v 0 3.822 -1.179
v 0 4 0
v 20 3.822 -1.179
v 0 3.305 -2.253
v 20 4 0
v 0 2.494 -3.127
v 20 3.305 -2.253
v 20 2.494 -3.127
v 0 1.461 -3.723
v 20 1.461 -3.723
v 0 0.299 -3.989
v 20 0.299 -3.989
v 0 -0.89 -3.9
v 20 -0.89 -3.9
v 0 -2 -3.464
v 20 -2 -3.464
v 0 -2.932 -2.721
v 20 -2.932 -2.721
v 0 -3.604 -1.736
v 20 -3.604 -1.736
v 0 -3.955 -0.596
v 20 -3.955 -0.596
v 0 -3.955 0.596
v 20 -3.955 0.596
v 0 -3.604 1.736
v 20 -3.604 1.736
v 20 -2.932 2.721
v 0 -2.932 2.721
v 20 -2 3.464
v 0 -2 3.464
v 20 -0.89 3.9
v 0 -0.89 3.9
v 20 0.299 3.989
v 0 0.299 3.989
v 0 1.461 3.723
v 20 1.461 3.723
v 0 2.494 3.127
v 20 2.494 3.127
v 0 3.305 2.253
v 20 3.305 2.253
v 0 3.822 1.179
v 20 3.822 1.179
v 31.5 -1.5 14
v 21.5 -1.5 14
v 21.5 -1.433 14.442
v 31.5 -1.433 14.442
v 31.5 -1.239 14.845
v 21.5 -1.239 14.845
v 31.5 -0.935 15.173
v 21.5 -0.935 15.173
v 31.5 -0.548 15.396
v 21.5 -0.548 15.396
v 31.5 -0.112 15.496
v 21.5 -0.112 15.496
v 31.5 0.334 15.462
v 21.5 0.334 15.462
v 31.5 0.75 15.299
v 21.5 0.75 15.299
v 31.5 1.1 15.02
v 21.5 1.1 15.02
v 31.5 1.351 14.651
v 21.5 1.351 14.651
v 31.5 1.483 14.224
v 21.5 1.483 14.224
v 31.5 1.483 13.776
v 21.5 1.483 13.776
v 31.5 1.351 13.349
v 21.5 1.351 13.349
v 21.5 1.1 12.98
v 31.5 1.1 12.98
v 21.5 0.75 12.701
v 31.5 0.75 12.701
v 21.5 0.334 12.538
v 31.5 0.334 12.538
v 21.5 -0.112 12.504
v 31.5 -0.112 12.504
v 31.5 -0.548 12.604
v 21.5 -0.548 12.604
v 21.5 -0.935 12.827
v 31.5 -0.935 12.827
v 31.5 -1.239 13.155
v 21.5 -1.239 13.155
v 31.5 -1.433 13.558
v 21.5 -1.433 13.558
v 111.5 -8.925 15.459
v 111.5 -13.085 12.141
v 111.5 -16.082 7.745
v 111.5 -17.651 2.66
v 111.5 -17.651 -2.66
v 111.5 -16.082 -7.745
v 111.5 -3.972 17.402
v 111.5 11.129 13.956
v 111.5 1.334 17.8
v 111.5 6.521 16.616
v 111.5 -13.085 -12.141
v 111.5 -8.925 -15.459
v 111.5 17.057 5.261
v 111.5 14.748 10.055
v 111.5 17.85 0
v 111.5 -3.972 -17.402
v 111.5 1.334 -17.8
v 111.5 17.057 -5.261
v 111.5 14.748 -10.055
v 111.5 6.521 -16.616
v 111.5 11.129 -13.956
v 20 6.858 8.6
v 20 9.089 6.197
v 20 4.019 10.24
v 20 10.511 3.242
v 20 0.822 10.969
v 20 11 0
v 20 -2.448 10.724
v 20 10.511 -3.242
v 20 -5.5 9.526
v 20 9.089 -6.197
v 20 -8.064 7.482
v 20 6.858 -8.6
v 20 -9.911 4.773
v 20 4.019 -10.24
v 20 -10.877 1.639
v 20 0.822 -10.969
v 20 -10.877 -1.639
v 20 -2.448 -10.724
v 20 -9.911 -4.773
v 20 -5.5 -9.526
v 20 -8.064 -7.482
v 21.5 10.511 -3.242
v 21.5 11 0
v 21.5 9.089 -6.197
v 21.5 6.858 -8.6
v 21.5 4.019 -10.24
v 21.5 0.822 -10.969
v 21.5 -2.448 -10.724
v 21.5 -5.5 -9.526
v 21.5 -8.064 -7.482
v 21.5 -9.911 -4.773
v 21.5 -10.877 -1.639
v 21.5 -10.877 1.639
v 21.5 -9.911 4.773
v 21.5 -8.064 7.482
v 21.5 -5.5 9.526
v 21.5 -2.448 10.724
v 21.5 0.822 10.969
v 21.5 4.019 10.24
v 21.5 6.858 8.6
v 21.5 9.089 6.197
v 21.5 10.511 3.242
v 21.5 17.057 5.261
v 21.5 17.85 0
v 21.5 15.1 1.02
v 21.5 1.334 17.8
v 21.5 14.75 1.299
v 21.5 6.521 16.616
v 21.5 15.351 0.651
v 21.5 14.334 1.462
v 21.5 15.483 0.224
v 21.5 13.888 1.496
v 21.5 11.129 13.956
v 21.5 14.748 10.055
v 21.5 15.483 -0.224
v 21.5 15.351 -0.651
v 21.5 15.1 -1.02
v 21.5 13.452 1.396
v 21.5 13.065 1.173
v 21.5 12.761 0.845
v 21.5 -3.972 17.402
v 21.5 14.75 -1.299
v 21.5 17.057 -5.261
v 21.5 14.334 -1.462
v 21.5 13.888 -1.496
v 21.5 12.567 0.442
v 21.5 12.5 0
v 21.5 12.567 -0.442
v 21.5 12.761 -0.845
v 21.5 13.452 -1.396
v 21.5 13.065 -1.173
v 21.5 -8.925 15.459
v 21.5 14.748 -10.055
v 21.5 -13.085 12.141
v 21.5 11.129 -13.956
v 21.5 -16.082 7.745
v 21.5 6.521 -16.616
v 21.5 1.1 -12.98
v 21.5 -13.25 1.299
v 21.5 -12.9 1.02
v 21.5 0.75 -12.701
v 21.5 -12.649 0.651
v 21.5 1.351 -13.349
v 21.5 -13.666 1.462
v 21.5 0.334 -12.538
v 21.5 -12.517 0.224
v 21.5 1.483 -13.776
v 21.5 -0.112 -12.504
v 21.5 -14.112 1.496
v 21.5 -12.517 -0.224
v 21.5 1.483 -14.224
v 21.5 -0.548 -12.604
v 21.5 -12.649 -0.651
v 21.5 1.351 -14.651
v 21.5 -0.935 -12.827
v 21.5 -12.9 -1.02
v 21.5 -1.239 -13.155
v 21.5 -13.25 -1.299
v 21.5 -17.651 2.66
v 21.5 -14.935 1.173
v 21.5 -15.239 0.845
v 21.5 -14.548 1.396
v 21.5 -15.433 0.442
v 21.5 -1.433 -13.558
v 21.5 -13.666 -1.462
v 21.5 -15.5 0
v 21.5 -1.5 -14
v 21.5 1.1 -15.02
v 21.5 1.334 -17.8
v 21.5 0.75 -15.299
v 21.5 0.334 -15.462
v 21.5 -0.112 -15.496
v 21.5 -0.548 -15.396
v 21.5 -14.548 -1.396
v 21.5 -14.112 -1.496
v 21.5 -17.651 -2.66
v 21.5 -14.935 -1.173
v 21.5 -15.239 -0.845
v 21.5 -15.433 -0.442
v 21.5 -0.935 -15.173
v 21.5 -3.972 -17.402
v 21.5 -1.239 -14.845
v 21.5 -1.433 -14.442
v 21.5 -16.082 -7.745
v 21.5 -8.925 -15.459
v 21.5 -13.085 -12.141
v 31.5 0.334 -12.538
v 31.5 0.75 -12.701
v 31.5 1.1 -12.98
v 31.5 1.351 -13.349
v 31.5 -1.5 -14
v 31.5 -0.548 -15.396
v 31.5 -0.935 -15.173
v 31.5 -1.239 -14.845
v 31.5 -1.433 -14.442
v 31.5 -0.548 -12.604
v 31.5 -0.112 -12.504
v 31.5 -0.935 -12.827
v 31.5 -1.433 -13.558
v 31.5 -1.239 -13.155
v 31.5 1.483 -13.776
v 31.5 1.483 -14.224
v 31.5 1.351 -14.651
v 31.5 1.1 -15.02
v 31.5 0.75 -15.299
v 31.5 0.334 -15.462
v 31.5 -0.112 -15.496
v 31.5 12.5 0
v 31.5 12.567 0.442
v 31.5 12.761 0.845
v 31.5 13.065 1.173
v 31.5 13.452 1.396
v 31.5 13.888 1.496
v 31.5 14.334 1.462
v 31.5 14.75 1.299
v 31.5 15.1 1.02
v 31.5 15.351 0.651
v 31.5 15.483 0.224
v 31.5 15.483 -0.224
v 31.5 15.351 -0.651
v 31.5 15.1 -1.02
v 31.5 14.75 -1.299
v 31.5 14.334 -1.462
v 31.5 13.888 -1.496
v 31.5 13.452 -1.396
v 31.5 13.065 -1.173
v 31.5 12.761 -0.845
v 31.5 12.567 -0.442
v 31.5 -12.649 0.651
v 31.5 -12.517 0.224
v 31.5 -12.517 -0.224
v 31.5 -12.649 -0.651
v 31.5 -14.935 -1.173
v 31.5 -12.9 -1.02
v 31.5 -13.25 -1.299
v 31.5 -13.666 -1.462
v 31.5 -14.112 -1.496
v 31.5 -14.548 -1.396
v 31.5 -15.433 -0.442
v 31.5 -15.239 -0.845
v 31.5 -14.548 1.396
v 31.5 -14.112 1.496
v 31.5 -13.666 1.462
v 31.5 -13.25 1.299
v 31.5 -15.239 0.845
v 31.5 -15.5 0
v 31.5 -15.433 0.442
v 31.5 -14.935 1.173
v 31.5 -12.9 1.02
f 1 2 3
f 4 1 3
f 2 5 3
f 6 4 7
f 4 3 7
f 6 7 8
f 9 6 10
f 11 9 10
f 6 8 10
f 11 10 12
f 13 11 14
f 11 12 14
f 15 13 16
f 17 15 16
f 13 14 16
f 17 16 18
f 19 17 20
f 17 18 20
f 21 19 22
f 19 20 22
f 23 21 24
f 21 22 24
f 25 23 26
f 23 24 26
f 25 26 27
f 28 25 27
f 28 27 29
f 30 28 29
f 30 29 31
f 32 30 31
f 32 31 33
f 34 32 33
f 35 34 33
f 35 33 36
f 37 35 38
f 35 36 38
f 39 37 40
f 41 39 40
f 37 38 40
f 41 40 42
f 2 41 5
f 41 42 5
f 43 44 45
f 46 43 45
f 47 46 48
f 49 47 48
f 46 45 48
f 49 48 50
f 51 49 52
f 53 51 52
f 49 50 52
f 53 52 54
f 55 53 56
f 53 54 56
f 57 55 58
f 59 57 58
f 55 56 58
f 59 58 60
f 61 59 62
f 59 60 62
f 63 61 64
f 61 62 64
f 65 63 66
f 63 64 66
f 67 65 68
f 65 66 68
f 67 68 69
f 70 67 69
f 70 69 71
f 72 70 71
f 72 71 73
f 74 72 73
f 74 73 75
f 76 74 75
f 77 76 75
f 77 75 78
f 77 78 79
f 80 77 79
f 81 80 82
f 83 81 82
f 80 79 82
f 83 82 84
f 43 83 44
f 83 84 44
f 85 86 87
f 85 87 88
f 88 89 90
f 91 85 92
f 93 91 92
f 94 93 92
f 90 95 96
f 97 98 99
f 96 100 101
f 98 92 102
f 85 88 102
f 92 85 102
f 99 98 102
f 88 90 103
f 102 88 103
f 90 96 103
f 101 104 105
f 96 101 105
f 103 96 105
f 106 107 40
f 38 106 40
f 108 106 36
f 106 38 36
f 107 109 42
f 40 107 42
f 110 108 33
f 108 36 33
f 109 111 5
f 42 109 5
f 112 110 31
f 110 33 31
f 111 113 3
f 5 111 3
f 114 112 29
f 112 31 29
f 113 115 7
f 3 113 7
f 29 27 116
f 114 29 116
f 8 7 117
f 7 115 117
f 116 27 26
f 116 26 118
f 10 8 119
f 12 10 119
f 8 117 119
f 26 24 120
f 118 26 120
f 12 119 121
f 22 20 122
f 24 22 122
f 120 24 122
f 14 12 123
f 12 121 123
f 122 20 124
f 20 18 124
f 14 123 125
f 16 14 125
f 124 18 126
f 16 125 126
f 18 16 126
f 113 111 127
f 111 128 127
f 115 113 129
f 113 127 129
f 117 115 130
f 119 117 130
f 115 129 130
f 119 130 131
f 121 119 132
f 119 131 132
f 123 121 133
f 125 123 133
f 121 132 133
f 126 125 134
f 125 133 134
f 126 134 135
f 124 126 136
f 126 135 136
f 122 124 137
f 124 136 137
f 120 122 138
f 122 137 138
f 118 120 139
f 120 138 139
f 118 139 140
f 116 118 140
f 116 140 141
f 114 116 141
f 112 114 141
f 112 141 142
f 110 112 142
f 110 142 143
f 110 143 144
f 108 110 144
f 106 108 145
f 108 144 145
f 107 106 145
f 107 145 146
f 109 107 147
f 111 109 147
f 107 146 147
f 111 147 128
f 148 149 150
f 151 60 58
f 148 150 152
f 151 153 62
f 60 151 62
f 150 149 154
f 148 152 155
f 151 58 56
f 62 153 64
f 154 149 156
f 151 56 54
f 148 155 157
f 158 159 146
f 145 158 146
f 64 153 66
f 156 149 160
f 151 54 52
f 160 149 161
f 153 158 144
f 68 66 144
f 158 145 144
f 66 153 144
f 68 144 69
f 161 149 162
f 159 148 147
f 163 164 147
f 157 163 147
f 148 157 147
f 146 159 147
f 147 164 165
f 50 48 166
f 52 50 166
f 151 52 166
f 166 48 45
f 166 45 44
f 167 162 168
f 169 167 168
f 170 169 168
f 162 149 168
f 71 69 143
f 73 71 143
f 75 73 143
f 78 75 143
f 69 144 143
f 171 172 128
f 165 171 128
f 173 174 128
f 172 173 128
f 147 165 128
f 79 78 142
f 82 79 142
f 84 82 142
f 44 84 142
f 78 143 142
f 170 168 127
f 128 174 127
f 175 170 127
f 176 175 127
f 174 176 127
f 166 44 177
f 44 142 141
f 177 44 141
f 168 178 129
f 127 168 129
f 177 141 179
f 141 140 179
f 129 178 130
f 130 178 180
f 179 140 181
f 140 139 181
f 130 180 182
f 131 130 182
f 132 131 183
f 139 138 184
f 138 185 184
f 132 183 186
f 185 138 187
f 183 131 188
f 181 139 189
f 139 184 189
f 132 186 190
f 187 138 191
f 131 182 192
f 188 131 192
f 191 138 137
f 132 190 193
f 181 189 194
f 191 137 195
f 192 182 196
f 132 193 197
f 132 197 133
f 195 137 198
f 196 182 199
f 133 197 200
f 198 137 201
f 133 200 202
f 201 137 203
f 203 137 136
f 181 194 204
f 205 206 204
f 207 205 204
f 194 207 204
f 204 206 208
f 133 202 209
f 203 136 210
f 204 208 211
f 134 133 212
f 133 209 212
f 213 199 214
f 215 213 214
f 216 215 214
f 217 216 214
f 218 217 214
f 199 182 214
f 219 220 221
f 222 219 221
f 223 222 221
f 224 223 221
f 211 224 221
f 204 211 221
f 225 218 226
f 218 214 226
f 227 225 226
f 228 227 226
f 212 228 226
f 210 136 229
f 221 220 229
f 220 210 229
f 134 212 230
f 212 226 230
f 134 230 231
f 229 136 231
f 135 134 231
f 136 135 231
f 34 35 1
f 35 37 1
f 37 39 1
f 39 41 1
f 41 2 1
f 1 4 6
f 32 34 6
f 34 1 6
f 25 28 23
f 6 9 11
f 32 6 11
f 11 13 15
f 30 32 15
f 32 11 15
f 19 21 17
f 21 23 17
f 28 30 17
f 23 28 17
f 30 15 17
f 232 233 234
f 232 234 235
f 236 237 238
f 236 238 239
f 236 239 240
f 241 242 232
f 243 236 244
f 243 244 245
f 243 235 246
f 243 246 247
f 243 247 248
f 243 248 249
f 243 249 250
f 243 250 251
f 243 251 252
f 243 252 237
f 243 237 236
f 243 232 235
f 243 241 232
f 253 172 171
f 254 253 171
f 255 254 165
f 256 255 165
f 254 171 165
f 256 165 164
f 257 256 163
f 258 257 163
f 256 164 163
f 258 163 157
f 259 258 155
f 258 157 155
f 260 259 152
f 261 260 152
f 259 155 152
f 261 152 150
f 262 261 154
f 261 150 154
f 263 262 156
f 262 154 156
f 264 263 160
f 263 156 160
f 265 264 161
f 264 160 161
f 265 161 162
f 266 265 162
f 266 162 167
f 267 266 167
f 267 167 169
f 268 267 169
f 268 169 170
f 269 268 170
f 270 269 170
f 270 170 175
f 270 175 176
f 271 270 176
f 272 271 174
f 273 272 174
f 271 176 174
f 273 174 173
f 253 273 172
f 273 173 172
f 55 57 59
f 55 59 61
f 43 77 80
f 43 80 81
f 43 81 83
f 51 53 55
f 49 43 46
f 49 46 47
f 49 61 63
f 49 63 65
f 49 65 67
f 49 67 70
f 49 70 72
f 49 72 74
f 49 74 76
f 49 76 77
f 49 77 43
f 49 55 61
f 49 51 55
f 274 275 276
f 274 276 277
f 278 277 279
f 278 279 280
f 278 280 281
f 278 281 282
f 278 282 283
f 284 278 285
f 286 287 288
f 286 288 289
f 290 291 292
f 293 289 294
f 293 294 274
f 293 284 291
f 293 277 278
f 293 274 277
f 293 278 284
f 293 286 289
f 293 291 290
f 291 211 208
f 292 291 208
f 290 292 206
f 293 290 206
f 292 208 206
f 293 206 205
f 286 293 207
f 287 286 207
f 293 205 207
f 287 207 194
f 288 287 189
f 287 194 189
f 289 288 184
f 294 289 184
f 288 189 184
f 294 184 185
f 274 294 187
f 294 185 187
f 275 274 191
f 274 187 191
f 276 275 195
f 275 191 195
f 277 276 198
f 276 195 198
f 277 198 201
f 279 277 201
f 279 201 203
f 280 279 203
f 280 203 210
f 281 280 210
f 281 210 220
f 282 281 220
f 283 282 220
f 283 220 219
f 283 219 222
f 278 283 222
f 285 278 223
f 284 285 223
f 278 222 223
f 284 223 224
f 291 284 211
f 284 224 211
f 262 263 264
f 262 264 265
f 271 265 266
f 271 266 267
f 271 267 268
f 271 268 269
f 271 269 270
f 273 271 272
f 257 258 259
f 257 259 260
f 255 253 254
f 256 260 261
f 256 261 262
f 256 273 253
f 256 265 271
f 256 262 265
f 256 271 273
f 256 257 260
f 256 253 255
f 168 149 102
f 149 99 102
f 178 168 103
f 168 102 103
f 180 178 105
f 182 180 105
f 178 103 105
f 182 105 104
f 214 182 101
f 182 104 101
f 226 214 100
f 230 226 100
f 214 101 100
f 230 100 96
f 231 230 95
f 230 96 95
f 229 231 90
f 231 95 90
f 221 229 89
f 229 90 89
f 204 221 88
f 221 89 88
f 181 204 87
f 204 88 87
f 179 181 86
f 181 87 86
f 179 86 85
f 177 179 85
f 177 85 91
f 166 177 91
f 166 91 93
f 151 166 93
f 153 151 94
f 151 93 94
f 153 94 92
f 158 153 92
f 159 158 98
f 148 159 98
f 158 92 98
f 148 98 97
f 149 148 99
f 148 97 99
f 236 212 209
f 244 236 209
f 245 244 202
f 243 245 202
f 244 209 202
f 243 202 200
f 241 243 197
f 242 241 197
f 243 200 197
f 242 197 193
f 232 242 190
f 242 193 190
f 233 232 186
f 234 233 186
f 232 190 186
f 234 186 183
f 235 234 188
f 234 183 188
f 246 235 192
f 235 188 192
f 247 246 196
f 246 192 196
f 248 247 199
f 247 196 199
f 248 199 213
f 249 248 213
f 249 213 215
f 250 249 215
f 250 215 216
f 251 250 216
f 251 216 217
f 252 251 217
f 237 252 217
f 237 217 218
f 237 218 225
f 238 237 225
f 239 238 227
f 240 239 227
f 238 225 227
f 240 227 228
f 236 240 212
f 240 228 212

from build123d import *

# Parameters (mm, degrees)
SKETCH2_R          = 1.5
CUT_EXTRUDE1_DEPTH = 10


with BuildPart() as part:
    # Sketch1 → Revolve1 (revolve)
    with BuildSketch(Plane.XY):
        Polygon((0, 0), (0, 4), (20, 4), (20, 11), (21.5, 11), (21.5, 17.85), (111.5, 17.85), (111.5, 0), align=None)
    revolve(axis=Axis((111.5, 0, 0), (-1, 0, 0)))

    # Sketch2 → Cut-Extrude1 (cut)
    with BuildSketch(Plane.ZY.offset(-21.5)):
        with Locations(Location((0, 14, 0), (0, 0, 270))):
            Circle(SKETCH2_R)
        with Locations(Location((14, 0, 0), (0, 0, 270))):
            Circle(SKETCH2_R)
        with Locations(Location((0, -14, 0), (0, 0, 270))):
            Circle(SKETCH2_R)
        with Locations(Location((-14, 0, 0), (0, 0, 270))):
            Circle(SKETCH2_R)
    extrude(amount=-CUT_EXTRUDE1_DEPTH, mode=Mode.SUBTRACT)


solid = part.part
